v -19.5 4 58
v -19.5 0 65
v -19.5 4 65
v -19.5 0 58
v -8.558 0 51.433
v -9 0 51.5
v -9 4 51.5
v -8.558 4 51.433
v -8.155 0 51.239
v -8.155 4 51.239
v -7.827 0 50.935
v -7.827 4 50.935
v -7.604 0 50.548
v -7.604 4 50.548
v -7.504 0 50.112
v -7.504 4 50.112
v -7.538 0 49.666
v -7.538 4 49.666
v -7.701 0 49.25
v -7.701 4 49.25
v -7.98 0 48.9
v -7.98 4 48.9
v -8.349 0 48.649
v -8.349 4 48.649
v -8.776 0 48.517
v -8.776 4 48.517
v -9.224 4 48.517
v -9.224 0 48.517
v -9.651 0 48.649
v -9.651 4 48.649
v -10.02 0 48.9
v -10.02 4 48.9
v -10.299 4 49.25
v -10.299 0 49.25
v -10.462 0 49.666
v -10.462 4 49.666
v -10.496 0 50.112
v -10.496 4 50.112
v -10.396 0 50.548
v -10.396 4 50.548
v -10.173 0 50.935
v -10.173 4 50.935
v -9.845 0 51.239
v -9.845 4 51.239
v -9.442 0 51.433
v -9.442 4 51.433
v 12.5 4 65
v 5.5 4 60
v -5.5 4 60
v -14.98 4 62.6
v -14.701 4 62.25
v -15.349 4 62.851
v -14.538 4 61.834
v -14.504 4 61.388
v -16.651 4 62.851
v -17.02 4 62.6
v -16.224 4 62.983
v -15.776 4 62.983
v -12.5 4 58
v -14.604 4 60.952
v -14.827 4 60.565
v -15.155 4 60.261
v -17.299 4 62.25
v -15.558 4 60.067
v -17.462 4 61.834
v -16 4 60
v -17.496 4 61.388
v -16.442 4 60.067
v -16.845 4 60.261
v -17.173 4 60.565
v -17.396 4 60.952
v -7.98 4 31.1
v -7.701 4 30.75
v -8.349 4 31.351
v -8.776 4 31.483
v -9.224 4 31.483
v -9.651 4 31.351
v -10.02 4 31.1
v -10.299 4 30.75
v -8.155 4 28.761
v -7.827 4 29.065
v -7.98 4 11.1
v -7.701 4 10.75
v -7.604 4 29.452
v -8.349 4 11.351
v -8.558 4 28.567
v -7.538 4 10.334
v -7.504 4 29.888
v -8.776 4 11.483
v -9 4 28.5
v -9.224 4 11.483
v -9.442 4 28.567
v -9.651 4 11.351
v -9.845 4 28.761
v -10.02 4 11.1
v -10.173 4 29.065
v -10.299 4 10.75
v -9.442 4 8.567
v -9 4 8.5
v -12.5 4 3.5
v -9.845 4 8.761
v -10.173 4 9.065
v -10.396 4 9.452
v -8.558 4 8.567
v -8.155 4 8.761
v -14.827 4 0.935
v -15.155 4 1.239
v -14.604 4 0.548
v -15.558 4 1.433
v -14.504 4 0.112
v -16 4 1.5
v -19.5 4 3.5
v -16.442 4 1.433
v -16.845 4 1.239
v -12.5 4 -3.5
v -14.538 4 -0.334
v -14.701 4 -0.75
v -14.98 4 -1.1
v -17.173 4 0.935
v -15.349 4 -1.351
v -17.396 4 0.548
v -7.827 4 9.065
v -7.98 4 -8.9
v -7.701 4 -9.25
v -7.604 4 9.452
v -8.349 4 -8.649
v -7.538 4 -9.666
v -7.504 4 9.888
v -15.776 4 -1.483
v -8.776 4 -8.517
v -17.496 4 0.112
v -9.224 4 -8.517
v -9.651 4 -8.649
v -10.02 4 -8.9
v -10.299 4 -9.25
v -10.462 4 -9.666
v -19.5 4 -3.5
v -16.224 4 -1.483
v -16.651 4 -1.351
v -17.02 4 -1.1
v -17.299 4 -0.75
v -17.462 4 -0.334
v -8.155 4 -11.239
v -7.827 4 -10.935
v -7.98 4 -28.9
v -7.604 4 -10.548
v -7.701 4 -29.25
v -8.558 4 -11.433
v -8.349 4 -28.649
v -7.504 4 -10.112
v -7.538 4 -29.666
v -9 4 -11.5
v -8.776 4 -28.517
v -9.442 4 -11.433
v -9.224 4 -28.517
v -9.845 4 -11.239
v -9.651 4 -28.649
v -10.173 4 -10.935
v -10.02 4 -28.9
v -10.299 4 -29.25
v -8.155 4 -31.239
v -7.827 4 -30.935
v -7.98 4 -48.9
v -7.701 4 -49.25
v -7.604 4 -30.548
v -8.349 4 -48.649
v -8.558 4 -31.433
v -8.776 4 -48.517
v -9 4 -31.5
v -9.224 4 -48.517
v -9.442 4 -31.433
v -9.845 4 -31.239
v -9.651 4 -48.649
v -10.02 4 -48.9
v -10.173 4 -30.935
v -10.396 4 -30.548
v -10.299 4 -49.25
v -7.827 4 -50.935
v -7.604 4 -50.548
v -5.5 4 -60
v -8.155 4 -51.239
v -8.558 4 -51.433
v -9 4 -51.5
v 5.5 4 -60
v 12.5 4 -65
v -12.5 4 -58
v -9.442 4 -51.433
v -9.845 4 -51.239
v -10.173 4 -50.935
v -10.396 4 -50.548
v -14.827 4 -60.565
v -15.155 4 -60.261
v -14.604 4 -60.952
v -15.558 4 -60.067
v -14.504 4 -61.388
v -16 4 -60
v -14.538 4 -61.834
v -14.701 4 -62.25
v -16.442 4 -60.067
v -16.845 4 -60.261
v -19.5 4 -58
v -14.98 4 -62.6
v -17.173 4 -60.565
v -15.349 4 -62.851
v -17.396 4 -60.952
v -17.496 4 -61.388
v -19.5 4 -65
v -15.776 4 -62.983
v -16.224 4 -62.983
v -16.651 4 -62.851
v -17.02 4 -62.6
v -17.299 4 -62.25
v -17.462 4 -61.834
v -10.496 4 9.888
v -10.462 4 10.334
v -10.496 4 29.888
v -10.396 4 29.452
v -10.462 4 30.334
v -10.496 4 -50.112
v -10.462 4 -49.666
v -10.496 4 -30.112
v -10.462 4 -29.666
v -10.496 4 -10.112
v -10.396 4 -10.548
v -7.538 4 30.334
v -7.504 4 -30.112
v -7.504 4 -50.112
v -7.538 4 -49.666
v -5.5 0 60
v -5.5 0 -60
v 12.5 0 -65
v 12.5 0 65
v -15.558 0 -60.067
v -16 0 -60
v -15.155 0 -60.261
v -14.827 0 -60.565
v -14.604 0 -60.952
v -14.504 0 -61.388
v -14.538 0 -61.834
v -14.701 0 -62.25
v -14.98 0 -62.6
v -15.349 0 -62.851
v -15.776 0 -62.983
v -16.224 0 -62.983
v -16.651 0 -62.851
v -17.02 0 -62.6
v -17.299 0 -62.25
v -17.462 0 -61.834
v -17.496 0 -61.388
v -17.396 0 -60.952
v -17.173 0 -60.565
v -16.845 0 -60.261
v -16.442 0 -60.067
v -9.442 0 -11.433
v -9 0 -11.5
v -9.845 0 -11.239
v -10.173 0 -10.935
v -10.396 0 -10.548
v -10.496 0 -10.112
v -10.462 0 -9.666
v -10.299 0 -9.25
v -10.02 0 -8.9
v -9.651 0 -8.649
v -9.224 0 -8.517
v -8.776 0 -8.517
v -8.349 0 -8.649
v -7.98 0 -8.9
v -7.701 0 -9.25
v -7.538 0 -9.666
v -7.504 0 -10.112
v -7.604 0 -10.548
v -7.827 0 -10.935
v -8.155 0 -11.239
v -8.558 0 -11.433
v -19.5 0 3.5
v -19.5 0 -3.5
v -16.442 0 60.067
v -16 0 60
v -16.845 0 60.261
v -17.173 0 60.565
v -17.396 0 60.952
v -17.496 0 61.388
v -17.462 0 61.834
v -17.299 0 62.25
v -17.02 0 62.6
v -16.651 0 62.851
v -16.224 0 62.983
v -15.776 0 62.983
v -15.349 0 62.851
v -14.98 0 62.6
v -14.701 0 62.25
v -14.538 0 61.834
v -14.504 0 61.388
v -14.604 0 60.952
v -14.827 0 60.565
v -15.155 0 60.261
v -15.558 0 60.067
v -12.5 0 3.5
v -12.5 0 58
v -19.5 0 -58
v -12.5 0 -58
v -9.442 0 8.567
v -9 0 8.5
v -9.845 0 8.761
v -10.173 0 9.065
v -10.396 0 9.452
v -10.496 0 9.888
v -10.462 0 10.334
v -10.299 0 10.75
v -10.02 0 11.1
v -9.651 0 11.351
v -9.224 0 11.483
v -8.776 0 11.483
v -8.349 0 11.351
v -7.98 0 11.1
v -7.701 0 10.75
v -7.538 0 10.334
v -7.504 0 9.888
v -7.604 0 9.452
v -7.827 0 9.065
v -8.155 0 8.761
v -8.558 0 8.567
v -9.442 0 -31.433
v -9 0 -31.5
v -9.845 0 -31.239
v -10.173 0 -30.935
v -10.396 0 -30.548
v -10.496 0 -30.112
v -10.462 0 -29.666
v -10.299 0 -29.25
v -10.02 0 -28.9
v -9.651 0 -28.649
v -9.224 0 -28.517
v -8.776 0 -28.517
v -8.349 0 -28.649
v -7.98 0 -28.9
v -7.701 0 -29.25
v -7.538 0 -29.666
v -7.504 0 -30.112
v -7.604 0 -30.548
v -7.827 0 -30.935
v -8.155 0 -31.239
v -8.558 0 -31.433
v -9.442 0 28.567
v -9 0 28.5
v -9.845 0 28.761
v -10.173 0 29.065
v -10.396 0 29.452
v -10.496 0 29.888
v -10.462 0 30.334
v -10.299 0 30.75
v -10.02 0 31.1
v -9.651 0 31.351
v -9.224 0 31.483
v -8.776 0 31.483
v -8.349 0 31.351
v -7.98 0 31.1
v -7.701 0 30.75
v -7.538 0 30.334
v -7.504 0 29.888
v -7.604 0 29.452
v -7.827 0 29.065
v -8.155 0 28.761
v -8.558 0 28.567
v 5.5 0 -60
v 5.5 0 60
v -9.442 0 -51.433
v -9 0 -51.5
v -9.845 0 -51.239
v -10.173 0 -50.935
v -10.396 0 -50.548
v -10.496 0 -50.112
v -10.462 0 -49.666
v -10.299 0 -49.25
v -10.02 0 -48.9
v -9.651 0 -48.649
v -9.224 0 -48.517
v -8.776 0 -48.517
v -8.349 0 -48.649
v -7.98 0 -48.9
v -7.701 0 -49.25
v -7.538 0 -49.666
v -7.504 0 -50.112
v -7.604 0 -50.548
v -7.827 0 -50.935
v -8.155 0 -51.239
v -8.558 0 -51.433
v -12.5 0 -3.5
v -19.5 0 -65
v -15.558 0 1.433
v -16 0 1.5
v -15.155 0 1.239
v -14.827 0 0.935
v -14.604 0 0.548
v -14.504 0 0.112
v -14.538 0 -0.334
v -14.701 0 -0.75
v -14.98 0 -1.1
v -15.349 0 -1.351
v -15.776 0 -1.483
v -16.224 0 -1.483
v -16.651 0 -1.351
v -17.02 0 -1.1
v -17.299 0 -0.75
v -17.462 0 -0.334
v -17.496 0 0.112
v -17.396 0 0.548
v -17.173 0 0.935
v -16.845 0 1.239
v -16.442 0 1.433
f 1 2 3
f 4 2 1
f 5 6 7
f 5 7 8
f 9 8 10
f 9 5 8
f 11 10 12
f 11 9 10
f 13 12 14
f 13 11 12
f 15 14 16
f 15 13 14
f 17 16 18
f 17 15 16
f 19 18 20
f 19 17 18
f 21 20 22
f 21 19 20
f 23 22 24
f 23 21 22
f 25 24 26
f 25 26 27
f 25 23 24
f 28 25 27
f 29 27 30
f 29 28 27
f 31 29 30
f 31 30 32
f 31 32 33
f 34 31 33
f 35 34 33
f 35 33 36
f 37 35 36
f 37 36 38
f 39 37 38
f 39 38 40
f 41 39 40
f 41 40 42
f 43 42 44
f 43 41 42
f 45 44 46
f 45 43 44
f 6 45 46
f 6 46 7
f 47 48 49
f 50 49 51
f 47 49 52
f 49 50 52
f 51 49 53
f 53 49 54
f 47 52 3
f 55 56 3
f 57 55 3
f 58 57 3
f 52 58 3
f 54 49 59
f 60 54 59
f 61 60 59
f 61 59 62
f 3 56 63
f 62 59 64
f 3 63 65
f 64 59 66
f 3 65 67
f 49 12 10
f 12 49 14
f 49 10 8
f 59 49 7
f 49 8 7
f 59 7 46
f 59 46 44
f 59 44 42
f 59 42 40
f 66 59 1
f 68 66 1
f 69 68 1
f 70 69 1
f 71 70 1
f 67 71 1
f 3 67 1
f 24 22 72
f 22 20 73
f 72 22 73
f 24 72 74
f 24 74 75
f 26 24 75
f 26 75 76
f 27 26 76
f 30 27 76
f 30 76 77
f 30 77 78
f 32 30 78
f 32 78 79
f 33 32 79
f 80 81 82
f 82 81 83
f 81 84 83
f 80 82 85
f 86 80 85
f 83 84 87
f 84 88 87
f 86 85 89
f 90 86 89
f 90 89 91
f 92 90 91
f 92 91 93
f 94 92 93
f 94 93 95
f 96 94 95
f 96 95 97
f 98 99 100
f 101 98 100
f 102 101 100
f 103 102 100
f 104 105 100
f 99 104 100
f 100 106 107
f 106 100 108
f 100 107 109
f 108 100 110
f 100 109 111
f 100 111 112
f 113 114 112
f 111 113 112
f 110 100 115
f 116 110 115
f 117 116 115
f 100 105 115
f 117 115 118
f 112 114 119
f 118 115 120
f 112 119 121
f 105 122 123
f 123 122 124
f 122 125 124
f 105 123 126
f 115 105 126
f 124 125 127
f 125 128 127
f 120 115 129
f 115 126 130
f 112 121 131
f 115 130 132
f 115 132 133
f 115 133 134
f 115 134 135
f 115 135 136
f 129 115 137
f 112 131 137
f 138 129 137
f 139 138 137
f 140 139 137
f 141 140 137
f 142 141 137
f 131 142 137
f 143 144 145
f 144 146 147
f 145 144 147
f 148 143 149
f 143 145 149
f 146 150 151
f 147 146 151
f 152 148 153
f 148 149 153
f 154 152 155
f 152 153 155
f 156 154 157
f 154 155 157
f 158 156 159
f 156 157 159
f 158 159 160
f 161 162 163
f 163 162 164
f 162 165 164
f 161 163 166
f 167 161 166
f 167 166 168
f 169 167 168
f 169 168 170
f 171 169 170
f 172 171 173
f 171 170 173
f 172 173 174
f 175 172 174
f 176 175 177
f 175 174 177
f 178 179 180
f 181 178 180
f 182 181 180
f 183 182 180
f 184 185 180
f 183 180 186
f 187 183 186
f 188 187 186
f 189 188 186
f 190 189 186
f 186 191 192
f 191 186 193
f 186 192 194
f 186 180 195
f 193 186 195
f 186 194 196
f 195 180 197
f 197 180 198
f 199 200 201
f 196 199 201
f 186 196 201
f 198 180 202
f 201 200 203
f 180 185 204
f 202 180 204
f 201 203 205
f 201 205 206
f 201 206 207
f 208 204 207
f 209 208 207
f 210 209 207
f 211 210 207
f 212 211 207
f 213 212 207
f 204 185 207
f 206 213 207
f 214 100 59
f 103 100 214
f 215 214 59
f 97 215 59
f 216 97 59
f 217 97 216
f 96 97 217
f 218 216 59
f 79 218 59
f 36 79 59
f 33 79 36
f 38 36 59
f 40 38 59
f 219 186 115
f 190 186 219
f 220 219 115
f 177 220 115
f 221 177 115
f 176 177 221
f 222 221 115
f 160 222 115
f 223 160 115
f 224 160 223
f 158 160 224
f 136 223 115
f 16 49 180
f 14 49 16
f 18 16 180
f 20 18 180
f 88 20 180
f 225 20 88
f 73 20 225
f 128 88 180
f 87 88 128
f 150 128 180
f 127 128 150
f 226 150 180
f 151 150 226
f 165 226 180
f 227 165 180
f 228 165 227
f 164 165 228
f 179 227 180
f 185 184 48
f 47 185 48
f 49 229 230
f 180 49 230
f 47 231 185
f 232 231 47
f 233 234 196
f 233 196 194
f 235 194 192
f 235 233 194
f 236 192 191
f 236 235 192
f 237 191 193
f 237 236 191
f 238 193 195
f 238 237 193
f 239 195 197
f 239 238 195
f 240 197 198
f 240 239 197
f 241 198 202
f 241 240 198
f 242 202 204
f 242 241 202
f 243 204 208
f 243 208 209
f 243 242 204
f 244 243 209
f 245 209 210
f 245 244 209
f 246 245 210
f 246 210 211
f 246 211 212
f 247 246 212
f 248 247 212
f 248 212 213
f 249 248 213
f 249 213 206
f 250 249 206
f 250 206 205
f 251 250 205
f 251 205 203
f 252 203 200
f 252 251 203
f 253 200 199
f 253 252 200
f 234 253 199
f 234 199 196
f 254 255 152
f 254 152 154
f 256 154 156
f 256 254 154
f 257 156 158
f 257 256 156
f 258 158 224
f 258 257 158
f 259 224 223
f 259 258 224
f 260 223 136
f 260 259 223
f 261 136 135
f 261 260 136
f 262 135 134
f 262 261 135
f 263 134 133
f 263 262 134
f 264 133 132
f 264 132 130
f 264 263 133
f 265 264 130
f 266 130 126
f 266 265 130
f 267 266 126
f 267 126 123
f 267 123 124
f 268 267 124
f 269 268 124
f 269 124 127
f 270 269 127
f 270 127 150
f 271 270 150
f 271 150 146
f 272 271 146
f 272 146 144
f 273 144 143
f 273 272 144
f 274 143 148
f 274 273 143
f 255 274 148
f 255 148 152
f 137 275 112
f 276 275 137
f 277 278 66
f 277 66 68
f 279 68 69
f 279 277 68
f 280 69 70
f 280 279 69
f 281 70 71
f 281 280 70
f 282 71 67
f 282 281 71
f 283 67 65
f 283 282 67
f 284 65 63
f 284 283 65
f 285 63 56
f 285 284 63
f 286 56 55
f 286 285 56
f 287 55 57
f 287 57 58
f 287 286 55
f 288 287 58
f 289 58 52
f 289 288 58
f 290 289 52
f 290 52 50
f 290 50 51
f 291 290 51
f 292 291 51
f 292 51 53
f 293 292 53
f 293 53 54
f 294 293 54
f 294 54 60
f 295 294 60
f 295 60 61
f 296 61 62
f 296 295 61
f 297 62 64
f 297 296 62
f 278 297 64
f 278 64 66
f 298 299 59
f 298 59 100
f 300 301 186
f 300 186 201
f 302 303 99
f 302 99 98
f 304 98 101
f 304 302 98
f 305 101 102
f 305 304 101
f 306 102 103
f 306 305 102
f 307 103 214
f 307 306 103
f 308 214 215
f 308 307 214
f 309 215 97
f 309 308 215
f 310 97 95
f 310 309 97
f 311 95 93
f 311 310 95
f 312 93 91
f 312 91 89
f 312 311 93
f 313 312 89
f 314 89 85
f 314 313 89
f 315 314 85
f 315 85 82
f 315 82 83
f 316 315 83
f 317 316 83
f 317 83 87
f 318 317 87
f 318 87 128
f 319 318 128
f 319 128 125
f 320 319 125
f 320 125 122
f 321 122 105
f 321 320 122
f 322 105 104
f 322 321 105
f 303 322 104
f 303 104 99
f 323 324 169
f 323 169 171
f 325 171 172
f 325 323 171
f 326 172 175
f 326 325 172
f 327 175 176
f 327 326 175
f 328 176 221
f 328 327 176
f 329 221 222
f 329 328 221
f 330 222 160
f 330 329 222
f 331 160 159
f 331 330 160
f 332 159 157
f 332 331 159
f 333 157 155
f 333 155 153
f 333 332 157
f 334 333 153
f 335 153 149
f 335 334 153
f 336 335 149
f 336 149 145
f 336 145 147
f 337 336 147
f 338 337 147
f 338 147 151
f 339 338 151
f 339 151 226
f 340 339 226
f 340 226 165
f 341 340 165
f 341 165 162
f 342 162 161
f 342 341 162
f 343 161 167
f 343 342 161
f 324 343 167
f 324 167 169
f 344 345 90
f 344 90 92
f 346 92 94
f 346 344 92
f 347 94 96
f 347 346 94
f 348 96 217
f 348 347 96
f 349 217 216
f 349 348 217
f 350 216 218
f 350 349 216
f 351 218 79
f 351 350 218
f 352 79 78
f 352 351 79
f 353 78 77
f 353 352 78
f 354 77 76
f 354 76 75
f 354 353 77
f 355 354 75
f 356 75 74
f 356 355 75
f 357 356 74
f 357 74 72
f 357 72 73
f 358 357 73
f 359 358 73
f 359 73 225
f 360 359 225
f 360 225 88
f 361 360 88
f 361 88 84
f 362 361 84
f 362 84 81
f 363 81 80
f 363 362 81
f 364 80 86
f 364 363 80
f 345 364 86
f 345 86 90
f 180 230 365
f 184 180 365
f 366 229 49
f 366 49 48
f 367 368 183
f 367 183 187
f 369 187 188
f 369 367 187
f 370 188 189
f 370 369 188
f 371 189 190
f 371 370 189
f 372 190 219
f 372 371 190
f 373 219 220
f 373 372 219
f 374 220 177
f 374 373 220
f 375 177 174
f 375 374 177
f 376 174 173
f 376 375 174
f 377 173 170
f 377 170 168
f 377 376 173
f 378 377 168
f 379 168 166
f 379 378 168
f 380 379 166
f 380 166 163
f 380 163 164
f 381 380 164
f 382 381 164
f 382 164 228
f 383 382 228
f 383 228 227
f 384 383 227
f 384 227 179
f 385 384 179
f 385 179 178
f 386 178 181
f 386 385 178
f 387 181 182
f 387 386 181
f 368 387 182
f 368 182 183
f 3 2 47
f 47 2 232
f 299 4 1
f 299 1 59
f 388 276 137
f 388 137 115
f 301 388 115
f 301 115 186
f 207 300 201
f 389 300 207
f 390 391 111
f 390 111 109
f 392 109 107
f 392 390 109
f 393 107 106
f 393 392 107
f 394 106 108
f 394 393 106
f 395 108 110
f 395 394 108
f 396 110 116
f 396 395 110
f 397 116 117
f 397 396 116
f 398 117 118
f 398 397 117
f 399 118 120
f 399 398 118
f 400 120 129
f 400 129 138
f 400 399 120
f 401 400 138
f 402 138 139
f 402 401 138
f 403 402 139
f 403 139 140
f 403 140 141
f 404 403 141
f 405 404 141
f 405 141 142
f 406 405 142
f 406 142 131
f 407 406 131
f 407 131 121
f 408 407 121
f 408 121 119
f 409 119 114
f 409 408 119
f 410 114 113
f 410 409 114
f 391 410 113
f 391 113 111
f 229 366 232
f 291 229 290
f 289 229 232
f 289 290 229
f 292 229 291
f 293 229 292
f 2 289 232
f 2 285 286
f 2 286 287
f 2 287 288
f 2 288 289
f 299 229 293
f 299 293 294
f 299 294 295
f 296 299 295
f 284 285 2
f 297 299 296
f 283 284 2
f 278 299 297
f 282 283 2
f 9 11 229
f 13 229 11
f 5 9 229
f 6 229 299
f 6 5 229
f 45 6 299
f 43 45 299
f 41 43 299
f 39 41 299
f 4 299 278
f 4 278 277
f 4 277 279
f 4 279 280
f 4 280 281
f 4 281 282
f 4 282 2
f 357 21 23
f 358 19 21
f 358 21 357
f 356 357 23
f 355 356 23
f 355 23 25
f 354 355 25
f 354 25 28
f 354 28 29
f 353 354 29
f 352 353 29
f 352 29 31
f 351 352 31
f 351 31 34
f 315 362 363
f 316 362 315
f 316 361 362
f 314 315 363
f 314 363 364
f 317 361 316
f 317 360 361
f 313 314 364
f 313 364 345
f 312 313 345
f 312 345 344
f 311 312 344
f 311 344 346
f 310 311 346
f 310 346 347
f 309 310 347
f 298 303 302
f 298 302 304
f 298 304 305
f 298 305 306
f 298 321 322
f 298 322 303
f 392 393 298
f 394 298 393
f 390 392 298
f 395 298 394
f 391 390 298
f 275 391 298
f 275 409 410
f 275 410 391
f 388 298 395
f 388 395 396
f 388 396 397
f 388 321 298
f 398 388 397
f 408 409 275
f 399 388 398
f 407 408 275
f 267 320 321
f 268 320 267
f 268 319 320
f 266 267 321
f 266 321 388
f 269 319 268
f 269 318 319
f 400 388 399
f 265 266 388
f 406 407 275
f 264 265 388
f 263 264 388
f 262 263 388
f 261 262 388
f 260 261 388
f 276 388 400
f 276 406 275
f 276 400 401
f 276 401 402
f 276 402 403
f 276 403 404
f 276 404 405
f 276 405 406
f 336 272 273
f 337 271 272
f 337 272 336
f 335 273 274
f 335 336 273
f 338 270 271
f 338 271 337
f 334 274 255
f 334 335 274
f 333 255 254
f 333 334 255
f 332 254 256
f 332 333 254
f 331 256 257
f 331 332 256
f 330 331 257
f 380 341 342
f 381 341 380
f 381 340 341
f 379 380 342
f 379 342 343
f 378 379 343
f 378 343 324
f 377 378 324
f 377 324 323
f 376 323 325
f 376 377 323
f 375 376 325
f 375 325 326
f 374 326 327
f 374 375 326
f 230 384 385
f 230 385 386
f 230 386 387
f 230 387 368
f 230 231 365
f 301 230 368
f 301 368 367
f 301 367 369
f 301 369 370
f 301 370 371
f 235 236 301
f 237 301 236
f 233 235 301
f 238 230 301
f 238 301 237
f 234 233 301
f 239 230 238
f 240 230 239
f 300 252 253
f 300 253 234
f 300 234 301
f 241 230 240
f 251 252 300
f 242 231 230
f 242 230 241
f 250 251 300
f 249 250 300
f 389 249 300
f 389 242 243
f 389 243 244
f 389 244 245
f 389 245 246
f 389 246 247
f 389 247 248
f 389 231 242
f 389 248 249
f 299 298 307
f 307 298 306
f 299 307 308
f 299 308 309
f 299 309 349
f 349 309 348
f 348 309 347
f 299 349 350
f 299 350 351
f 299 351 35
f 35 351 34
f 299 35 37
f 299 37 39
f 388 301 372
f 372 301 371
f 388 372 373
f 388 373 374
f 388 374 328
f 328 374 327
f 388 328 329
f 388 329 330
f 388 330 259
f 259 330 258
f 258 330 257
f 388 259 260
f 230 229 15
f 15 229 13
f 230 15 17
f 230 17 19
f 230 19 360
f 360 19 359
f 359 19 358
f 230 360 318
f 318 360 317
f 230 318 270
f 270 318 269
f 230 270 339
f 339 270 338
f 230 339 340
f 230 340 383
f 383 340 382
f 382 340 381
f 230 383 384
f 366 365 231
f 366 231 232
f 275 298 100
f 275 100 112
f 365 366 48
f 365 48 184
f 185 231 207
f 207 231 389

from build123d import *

# Parameters (mm, degrees)
SKETCH1_R           = 1.5
SKETCH1_W           = 11
SKETCH1_H           = 120
BOSS_EXTRUDE1_DEPTH = 4


with BuildPart() as part:
    # Sketch1 → Boss-Extrude1 (new body)
    with BuildSketch(Plane(origin=(0, 0, 0), x_dir=(1, 0, 0), z_dir=(0, 1, 0))):
        Polygon((-12.5, 65), (12.5, 65), (12.5, -65), (-12.5, -65), (-19.5, -65), (-19.5, -58), (-12.5, -58), (-12.5, -3.5), (-19.5, -3.5), (-19.5, 3.5), (-12.5, 3.5), (-12.5, 58), (-19.5, 58), (-19.5, 65), align=None)
        with Locations(Location((-9, 50, 0), (0, 0, 90))):
            Circle(SKETCH1_R, mode=Mode.SUBTRACT)
        with Locations(Location((-16, 61.5, 0), (0, 0, 270))):
            Circle(SKETCH1_R, mode=Mode.SUBTRACT)
        with Locations(Location((-16, 0, 0), (0, 0, 270))):
            Circle(SKETCH1_R, mode=Mode.SUBTRACT)
        with Locations(Location((-16, -61.5, 0), (0, 0, 90))):
            Circle(SKETCH1_R, mode=Mode.SUBTRACT)
        with Locations(Location((-9, -50, 0), (0, 0, 270))):
            Circle(SKETCH1_R, mode=Mode.SUBTRACT)
        with Locations(Location((-9, 30, 0), (0, 0, 90))):
            Circle(SKETCH1_R, mode=Mode.SUBTRACT)
        with Locations(Location((-9, 10, 0), (0, 0, 90))):
            Circle(SKETCH1_R, mode=Mode.SUBTRACT)
        with Locations(Location((-9, -10, 0), (0, 0, 90))):
            Circle(SKETCH1_R, mode=Mode.SUBTRACT)
        with Locations(Location((-9, -30, 0), (0, 0, 90))):
            Circle(SKETCH1_R, mode=Mode.SUBTRACT)
        Rectangle(SKETCH1_W, SKETCH1_H, mode=Mode.SUBTRACT)
    extrude(amount=BOSS_EXTRUDE1_DEPTH)


solid = part.part
